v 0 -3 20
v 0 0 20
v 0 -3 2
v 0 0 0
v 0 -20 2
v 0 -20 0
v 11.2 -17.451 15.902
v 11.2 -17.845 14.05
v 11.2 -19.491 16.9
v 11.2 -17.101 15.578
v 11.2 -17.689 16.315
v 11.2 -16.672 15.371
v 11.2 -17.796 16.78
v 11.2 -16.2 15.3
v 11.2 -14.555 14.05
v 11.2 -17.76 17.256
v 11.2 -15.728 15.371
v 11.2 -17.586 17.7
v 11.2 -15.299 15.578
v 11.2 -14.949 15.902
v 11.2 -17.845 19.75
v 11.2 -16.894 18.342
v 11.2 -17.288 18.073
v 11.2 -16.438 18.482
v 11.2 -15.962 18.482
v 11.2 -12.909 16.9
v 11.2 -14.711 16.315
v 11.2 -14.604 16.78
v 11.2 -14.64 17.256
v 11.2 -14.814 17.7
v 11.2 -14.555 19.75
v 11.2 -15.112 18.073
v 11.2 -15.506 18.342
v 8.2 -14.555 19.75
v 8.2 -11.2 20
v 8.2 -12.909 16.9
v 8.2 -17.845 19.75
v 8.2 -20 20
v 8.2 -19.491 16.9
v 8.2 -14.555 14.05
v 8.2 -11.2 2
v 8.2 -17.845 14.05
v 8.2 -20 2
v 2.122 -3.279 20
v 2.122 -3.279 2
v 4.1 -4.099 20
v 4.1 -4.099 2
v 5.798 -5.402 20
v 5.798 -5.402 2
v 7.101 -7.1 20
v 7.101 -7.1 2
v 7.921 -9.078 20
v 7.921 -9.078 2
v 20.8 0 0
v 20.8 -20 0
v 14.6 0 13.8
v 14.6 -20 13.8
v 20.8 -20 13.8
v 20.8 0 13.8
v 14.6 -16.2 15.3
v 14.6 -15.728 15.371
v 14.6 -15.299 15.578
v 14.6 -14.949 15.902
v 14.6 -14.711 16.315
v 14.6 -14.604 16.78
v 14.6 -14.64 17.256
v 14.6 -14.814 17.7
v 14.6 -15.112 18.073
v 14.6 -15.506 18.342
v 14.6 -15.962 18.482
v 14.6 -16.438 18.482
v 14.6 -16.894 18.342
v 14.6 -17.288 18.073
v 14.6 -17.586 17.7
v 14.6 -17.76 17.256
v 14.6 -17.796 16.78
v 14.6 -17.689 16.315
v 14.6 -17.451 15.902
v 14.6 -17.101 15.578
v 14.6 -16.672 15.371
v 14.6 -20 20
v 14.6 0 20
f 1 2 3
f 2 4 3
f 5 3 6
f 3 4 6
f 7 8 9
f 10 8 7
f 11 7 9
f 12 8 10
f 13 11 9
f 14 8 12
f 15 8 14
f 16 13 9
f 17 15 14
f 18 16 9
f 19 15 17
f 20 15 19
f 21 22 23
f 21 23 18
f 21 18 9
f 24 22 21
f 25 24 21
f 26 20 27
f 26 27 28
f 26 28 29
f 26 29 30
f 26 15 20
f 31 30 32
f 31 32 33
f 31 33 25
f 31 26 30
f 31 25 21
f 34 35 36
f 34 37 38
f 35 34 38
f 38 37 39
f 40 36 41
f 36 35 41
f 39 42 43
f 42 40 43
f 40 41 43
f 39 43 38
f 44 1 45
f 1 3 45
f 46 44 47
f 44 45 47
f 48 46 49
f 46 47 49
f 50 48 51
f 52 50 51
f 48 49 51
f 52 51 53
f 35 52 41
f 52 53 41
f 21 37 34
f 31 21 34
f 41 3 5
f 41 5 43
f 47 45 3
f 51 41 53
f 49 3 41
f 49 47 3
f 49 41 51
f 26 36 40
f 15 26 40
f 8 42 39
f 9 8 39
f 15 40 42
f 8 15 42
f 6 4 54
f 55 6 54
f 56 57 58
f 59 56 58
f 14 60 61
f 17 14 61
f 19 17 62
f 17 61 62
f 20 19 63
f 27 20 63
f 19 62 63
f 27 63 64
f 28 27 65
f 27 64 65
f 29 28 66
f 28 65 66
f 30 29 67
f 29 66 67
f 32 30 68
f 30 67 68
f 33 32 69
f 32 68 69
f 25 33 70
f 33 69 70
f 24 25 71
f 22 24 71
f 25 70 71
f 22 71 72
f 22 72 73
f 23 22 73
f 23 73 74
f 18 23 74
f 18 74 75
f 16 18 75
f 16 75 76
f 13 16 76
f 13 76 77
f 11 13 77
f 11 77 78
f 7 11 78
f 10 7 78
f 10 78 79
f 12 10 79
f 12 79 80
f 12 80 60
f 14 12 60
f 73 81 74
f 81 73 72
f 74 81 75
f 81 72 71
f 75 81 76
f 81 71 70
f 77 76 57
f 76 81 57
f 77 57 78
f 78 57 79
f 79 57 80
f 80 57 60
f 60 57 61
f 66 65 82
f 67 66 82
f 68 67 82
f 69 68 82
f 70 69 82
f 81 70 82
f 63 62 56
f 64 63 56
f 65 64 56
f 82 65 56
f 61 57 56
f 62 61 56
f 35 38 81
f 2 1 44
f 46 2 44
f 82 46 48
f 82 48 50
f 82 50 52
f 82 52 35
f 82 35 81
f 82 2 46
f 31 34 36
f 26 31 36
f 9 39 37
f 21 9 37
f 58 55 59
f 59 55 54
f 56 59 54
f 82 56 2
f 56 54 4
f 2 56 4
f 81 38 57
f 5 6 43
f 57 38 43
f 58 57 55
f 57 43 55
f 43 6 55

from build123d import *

# Parameters (mm, degrees)
CROQUIS1_W              = 20.8
CROQUIS1_H              = 20
SALIENTE_EXTRUIR1_DEPTH = 2
SALIENTE_EXTRUIR2_DEPTH = 11.8
SALIENTE_EXTRUIR3_DEPTH = 6.2
CORTAR_EXTRUIR1_REACH   = 16.6
CROQUIS4_R              = 1.6
CORTAR_EXTRUIR2_DEPTH   = 3


with BuildPart() as part:
    # Croquis1 → Saliente-Extruir1 (new body)
    with BuildSketch(Plane.XY):
        with Locations((10.4, -10)):
            Rectangle(CROQUIS1_W, CROQUIS1_H)
    extrude(amount=SALIENTE_EXTRUIR1_DEPTH)

    # Croquis2 → Saliente-Extruir2 (add)
    with BuildSketch(Plane.XY.offset(2)):
        with BuildLine():
            Line((8.2, -11.2), (8.2, -20))
            Line((8.2, -20), (20.8, -20))
            Line((20.8, -20), (20.8, 0))
            Line((20.8, 0), (0, 0))
            Line((0, 0), (0, -3))
            ThreePointArc((0, -3), (5.798275606, -5.401724394), (8.2, -11.2))
        make_face()
    extrude(amount=SALIENTE_EXTRUIR2_DEPTH)

    # Croquis3 → Saliente-Extruir3 (add)
    with BuildSketch(Plane.XY.offset(13.8)):
        with BuildLine():
            Line((14.6, -20), (14.6, 0))
            Line((14.6, 0), (0, 0))
            Line((0, 0), (0, -3))
            ThreePointArc((0, -3), (5.798275606, -5.401724394), (8.2, -11.2))
            Line((8.2, -11.2), (8.2, -20))
            Line((8.2, -20), (14.6, -20))
        make_face()
    extrude(amount=SALIENTE_EXTRUIR3_DEPTH)

    # Croquis4 → Cortar-Extruir1 (cut, up to next)
    with BuildSketch(Plane(origin=(14.6, 0, 0), x_dir=(0, 0, -1), z_dir=(1, 0, 0)), mode=Mode.PRIVATE) as cortar_extruir1_sk1:
        with Locations((-16.9, -16.2)):
            Circle(CROQUIS4_R)
    cortar_extruir1_tool1 = extrude(cortar_extruir1_sk1.sketch, amount=-CORTAR_EXTRUIR1_REACH, mode=Mode.PRIVATE) & part.part
    add(cortar_extruir1_tool1.solids().sort_by_distance((14.6, -16.2, 16.9))[0], mode=Mode.SUBTRACT)

    # Croquis5 → Cortar-Extruir2 (cut)
    with BuildSketch(Plane.ZY.offset(-8.2)):
        Polygon((16.9, -19.490896534), (19.75, -17.845448267), (19.75, -14.554551733), (16.9, -12.909103466), (14.05, -14.554551733), (14.05, -17.845448267), align=None)
    extrude(amount=-CORTAR_EXTRUIR2_DEPTH, mode=Mode.SUBTRACT)


solid = part.part
